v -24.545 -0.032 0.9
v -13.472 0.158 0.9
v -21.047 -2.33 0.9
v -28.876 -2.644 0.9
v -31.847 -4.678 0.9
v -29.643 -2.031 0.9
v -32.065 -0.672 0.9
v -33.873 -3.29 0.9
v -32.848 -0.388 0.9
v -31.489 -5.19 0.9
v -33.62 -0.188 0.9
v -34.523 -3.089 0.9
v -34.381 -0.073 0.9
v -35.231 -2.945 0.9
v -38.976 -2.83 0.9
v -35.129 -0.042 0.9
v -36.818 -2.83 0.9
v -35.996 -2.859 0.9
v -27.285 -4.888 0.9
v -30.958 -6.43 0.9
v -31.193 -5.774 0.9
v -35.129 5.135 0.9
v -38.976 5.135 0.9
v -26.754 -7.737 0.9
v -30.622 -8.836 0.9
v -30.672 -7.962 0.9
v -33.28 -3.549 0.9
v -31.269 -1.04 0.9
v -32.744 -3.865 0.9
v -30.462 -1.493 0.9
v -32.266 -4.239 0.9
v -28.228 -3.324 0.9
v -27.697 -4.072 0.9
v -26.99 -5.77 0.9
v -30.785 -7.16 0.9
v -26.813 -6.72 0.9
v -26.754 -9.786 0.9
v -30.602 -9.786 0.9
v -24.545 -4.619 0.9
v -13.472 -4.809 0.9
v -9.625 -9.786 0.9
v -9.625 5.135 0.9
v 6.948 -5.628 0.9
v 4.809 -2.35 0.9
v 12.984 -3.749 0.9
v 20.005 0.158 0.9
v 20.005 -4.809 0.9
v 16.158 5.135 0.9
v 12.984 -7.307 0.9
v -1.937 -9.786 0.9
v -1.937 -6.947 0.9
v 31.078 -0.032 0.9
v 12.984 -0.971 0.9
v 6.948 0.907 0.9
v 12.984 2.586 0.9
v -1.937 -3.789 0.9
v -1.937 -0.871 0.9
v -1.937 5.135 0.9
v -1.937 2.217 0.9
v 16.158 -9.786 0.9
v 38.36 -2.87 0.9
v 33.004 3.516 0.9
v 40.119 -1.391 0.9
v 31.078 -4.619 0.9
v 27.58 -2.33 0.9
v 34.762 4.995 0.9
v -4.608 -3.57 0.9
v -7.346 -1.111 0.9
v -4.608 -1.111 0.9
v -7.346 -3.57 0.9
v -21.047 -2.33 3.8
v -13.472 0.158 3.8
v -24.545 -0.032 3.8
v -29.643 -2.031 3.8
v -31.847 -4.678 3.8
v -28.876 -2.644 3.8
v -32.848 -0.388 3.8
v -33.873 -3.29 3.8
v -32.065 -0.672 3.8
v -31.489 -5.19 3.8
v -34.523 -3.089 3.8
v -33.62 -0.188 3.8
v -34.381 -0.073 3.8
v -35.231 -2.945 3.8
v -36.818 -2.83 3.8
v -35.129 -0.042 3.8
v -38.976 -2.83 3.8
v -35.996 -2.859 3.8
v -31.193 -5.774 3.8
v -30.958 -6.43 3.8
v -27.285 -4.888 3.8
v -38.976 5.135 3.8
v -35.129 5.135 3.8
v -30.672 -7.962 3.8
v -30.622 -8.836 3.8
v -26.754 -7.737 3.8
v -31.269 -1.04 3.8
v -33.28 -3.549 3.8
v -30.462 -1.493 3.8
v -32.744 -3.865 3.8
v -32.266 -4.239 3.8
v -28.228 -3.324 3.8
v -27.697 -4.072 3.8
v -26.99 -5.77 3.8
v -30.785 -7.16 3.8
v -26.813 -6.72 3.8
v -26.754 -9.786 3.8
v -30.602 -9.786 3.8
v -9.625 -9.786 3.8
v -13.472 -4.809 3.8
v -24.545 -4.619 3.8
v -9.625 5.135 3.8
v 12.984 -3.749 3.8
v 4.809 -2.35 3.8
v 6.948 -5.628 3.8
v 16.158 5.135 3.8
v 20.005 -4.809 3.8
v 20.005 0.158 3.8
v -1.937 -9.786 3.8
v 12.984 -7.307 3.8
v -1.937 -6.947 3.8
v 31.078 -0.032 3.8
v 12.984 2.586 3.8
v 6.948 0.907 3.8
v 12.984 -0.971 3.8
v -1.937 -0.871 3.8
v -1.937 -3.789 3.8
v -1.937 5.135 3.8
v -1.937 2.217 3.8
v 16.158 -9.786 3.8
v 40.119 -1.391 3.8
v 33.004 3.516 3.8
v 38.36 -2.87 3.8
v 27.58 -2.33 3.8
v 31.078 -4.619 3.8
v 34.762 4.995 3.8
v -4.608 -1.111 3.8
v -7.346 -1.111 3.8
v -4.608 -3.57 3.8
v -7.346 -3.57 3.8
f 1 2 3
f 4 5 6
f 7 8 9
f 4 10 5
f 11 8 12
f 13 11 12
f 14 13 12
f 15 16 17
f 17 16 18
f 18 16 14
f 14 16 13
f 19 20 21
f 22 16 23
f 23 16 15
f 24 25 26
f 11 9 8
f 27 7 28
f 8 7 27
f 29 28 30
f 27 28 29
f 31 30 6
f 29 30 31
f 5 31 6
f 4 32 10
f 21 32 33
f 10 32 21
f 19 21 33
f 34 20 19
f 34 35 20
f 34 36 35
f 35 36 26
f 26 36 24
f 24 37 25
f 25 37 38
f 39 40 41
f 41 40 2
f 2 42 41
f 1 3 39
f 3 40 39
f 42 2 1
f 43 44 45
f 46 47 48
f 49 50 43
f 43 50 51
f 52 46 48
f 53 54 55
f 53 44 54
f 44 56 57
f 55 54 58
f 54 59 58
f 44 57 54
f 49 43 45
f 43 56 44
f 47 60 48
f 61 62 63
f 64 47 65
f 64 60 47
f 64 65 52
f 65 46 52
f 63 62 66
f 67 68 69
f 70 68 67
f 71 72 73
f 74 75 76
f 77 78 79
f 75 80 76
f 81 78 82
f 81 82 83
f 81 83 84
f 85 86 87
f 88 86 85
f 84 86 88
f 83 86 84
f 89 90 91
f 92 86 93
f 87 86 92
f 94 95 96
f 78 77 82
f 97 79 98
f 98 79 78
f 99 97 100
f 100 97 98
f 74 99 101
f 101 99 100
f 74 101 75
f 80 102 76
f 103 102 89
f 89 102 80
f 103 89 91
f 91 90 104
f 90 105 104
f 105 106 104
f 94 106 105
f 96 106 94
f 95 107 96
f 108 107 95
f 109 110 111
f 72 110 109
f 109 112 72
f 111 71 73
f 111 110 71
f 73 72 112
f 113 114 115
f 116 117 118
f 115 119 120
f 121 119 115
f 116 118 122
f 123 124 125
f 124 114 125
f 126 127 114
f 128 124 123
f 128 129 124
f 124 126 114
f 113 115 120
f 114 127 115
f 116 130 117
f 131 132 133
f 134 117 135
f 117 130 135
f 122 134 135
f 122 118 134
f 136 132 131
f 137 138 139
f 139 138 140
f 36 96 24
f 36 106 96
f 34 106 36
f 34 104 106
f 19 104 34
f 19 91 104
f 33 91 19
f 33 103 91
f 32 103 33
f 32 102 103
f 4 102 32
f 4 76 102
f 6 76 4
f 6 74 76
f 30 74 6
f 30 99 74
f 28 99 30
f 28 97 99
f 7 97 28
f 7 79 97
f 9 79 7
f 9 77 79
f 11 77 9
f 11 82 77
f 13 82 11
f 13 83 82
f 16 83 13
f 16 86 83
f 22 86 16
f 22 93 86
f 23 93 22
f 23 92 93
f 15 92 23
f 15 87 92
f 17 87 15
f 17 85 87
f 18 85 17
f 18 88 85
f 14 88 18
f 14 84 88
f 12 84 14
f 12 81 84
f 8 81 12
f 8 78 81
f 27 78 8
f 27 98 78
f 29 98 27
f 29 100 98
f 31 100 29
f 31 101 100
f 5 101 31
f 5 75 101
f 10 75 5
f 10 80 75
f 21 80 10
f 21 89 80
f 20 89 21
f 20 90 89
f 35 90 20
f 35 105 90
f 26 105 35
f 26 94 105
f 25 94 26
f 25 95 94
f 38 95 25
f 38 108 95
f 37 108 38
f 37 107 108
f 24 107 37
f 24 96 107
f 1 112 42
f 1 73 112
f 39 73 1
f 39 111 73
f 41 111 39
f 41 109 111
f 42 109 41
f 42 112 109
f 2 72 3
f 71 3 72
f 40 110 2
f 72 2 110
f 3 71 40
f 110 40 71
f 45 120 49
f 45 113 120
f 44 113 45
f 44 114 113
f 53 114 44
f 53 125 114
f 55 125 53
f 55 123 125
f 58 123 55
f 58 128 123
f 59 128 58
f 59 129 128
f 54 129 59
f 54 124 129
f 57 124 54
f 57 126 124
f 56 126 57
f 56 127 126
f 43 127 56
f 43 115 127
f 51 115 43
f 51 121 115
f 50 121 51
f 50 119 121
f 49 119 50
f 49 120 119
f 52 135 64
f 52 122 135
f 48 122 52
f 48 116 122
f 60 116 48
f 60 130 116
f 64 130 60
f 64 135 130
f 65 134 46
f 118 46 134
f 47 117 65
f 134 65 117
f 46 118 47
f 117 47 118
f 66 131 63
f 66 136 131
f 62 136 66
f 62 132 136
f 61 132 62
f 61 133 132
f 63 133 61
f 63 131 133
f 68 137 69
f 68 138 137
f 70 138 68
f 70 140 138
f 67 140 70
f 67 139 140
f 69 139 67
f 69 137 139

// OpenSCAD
$fn = 48;
  // syllabics (overlaid on icon, tallest)
  translate([0, -2.500, 0.900]) linear_extrude(height=2.900) text("ᓴᐘᕒᐅᐠ", size=14.737, halign="center", valign="center", font="Euphemia UCAS:style=Bold");
